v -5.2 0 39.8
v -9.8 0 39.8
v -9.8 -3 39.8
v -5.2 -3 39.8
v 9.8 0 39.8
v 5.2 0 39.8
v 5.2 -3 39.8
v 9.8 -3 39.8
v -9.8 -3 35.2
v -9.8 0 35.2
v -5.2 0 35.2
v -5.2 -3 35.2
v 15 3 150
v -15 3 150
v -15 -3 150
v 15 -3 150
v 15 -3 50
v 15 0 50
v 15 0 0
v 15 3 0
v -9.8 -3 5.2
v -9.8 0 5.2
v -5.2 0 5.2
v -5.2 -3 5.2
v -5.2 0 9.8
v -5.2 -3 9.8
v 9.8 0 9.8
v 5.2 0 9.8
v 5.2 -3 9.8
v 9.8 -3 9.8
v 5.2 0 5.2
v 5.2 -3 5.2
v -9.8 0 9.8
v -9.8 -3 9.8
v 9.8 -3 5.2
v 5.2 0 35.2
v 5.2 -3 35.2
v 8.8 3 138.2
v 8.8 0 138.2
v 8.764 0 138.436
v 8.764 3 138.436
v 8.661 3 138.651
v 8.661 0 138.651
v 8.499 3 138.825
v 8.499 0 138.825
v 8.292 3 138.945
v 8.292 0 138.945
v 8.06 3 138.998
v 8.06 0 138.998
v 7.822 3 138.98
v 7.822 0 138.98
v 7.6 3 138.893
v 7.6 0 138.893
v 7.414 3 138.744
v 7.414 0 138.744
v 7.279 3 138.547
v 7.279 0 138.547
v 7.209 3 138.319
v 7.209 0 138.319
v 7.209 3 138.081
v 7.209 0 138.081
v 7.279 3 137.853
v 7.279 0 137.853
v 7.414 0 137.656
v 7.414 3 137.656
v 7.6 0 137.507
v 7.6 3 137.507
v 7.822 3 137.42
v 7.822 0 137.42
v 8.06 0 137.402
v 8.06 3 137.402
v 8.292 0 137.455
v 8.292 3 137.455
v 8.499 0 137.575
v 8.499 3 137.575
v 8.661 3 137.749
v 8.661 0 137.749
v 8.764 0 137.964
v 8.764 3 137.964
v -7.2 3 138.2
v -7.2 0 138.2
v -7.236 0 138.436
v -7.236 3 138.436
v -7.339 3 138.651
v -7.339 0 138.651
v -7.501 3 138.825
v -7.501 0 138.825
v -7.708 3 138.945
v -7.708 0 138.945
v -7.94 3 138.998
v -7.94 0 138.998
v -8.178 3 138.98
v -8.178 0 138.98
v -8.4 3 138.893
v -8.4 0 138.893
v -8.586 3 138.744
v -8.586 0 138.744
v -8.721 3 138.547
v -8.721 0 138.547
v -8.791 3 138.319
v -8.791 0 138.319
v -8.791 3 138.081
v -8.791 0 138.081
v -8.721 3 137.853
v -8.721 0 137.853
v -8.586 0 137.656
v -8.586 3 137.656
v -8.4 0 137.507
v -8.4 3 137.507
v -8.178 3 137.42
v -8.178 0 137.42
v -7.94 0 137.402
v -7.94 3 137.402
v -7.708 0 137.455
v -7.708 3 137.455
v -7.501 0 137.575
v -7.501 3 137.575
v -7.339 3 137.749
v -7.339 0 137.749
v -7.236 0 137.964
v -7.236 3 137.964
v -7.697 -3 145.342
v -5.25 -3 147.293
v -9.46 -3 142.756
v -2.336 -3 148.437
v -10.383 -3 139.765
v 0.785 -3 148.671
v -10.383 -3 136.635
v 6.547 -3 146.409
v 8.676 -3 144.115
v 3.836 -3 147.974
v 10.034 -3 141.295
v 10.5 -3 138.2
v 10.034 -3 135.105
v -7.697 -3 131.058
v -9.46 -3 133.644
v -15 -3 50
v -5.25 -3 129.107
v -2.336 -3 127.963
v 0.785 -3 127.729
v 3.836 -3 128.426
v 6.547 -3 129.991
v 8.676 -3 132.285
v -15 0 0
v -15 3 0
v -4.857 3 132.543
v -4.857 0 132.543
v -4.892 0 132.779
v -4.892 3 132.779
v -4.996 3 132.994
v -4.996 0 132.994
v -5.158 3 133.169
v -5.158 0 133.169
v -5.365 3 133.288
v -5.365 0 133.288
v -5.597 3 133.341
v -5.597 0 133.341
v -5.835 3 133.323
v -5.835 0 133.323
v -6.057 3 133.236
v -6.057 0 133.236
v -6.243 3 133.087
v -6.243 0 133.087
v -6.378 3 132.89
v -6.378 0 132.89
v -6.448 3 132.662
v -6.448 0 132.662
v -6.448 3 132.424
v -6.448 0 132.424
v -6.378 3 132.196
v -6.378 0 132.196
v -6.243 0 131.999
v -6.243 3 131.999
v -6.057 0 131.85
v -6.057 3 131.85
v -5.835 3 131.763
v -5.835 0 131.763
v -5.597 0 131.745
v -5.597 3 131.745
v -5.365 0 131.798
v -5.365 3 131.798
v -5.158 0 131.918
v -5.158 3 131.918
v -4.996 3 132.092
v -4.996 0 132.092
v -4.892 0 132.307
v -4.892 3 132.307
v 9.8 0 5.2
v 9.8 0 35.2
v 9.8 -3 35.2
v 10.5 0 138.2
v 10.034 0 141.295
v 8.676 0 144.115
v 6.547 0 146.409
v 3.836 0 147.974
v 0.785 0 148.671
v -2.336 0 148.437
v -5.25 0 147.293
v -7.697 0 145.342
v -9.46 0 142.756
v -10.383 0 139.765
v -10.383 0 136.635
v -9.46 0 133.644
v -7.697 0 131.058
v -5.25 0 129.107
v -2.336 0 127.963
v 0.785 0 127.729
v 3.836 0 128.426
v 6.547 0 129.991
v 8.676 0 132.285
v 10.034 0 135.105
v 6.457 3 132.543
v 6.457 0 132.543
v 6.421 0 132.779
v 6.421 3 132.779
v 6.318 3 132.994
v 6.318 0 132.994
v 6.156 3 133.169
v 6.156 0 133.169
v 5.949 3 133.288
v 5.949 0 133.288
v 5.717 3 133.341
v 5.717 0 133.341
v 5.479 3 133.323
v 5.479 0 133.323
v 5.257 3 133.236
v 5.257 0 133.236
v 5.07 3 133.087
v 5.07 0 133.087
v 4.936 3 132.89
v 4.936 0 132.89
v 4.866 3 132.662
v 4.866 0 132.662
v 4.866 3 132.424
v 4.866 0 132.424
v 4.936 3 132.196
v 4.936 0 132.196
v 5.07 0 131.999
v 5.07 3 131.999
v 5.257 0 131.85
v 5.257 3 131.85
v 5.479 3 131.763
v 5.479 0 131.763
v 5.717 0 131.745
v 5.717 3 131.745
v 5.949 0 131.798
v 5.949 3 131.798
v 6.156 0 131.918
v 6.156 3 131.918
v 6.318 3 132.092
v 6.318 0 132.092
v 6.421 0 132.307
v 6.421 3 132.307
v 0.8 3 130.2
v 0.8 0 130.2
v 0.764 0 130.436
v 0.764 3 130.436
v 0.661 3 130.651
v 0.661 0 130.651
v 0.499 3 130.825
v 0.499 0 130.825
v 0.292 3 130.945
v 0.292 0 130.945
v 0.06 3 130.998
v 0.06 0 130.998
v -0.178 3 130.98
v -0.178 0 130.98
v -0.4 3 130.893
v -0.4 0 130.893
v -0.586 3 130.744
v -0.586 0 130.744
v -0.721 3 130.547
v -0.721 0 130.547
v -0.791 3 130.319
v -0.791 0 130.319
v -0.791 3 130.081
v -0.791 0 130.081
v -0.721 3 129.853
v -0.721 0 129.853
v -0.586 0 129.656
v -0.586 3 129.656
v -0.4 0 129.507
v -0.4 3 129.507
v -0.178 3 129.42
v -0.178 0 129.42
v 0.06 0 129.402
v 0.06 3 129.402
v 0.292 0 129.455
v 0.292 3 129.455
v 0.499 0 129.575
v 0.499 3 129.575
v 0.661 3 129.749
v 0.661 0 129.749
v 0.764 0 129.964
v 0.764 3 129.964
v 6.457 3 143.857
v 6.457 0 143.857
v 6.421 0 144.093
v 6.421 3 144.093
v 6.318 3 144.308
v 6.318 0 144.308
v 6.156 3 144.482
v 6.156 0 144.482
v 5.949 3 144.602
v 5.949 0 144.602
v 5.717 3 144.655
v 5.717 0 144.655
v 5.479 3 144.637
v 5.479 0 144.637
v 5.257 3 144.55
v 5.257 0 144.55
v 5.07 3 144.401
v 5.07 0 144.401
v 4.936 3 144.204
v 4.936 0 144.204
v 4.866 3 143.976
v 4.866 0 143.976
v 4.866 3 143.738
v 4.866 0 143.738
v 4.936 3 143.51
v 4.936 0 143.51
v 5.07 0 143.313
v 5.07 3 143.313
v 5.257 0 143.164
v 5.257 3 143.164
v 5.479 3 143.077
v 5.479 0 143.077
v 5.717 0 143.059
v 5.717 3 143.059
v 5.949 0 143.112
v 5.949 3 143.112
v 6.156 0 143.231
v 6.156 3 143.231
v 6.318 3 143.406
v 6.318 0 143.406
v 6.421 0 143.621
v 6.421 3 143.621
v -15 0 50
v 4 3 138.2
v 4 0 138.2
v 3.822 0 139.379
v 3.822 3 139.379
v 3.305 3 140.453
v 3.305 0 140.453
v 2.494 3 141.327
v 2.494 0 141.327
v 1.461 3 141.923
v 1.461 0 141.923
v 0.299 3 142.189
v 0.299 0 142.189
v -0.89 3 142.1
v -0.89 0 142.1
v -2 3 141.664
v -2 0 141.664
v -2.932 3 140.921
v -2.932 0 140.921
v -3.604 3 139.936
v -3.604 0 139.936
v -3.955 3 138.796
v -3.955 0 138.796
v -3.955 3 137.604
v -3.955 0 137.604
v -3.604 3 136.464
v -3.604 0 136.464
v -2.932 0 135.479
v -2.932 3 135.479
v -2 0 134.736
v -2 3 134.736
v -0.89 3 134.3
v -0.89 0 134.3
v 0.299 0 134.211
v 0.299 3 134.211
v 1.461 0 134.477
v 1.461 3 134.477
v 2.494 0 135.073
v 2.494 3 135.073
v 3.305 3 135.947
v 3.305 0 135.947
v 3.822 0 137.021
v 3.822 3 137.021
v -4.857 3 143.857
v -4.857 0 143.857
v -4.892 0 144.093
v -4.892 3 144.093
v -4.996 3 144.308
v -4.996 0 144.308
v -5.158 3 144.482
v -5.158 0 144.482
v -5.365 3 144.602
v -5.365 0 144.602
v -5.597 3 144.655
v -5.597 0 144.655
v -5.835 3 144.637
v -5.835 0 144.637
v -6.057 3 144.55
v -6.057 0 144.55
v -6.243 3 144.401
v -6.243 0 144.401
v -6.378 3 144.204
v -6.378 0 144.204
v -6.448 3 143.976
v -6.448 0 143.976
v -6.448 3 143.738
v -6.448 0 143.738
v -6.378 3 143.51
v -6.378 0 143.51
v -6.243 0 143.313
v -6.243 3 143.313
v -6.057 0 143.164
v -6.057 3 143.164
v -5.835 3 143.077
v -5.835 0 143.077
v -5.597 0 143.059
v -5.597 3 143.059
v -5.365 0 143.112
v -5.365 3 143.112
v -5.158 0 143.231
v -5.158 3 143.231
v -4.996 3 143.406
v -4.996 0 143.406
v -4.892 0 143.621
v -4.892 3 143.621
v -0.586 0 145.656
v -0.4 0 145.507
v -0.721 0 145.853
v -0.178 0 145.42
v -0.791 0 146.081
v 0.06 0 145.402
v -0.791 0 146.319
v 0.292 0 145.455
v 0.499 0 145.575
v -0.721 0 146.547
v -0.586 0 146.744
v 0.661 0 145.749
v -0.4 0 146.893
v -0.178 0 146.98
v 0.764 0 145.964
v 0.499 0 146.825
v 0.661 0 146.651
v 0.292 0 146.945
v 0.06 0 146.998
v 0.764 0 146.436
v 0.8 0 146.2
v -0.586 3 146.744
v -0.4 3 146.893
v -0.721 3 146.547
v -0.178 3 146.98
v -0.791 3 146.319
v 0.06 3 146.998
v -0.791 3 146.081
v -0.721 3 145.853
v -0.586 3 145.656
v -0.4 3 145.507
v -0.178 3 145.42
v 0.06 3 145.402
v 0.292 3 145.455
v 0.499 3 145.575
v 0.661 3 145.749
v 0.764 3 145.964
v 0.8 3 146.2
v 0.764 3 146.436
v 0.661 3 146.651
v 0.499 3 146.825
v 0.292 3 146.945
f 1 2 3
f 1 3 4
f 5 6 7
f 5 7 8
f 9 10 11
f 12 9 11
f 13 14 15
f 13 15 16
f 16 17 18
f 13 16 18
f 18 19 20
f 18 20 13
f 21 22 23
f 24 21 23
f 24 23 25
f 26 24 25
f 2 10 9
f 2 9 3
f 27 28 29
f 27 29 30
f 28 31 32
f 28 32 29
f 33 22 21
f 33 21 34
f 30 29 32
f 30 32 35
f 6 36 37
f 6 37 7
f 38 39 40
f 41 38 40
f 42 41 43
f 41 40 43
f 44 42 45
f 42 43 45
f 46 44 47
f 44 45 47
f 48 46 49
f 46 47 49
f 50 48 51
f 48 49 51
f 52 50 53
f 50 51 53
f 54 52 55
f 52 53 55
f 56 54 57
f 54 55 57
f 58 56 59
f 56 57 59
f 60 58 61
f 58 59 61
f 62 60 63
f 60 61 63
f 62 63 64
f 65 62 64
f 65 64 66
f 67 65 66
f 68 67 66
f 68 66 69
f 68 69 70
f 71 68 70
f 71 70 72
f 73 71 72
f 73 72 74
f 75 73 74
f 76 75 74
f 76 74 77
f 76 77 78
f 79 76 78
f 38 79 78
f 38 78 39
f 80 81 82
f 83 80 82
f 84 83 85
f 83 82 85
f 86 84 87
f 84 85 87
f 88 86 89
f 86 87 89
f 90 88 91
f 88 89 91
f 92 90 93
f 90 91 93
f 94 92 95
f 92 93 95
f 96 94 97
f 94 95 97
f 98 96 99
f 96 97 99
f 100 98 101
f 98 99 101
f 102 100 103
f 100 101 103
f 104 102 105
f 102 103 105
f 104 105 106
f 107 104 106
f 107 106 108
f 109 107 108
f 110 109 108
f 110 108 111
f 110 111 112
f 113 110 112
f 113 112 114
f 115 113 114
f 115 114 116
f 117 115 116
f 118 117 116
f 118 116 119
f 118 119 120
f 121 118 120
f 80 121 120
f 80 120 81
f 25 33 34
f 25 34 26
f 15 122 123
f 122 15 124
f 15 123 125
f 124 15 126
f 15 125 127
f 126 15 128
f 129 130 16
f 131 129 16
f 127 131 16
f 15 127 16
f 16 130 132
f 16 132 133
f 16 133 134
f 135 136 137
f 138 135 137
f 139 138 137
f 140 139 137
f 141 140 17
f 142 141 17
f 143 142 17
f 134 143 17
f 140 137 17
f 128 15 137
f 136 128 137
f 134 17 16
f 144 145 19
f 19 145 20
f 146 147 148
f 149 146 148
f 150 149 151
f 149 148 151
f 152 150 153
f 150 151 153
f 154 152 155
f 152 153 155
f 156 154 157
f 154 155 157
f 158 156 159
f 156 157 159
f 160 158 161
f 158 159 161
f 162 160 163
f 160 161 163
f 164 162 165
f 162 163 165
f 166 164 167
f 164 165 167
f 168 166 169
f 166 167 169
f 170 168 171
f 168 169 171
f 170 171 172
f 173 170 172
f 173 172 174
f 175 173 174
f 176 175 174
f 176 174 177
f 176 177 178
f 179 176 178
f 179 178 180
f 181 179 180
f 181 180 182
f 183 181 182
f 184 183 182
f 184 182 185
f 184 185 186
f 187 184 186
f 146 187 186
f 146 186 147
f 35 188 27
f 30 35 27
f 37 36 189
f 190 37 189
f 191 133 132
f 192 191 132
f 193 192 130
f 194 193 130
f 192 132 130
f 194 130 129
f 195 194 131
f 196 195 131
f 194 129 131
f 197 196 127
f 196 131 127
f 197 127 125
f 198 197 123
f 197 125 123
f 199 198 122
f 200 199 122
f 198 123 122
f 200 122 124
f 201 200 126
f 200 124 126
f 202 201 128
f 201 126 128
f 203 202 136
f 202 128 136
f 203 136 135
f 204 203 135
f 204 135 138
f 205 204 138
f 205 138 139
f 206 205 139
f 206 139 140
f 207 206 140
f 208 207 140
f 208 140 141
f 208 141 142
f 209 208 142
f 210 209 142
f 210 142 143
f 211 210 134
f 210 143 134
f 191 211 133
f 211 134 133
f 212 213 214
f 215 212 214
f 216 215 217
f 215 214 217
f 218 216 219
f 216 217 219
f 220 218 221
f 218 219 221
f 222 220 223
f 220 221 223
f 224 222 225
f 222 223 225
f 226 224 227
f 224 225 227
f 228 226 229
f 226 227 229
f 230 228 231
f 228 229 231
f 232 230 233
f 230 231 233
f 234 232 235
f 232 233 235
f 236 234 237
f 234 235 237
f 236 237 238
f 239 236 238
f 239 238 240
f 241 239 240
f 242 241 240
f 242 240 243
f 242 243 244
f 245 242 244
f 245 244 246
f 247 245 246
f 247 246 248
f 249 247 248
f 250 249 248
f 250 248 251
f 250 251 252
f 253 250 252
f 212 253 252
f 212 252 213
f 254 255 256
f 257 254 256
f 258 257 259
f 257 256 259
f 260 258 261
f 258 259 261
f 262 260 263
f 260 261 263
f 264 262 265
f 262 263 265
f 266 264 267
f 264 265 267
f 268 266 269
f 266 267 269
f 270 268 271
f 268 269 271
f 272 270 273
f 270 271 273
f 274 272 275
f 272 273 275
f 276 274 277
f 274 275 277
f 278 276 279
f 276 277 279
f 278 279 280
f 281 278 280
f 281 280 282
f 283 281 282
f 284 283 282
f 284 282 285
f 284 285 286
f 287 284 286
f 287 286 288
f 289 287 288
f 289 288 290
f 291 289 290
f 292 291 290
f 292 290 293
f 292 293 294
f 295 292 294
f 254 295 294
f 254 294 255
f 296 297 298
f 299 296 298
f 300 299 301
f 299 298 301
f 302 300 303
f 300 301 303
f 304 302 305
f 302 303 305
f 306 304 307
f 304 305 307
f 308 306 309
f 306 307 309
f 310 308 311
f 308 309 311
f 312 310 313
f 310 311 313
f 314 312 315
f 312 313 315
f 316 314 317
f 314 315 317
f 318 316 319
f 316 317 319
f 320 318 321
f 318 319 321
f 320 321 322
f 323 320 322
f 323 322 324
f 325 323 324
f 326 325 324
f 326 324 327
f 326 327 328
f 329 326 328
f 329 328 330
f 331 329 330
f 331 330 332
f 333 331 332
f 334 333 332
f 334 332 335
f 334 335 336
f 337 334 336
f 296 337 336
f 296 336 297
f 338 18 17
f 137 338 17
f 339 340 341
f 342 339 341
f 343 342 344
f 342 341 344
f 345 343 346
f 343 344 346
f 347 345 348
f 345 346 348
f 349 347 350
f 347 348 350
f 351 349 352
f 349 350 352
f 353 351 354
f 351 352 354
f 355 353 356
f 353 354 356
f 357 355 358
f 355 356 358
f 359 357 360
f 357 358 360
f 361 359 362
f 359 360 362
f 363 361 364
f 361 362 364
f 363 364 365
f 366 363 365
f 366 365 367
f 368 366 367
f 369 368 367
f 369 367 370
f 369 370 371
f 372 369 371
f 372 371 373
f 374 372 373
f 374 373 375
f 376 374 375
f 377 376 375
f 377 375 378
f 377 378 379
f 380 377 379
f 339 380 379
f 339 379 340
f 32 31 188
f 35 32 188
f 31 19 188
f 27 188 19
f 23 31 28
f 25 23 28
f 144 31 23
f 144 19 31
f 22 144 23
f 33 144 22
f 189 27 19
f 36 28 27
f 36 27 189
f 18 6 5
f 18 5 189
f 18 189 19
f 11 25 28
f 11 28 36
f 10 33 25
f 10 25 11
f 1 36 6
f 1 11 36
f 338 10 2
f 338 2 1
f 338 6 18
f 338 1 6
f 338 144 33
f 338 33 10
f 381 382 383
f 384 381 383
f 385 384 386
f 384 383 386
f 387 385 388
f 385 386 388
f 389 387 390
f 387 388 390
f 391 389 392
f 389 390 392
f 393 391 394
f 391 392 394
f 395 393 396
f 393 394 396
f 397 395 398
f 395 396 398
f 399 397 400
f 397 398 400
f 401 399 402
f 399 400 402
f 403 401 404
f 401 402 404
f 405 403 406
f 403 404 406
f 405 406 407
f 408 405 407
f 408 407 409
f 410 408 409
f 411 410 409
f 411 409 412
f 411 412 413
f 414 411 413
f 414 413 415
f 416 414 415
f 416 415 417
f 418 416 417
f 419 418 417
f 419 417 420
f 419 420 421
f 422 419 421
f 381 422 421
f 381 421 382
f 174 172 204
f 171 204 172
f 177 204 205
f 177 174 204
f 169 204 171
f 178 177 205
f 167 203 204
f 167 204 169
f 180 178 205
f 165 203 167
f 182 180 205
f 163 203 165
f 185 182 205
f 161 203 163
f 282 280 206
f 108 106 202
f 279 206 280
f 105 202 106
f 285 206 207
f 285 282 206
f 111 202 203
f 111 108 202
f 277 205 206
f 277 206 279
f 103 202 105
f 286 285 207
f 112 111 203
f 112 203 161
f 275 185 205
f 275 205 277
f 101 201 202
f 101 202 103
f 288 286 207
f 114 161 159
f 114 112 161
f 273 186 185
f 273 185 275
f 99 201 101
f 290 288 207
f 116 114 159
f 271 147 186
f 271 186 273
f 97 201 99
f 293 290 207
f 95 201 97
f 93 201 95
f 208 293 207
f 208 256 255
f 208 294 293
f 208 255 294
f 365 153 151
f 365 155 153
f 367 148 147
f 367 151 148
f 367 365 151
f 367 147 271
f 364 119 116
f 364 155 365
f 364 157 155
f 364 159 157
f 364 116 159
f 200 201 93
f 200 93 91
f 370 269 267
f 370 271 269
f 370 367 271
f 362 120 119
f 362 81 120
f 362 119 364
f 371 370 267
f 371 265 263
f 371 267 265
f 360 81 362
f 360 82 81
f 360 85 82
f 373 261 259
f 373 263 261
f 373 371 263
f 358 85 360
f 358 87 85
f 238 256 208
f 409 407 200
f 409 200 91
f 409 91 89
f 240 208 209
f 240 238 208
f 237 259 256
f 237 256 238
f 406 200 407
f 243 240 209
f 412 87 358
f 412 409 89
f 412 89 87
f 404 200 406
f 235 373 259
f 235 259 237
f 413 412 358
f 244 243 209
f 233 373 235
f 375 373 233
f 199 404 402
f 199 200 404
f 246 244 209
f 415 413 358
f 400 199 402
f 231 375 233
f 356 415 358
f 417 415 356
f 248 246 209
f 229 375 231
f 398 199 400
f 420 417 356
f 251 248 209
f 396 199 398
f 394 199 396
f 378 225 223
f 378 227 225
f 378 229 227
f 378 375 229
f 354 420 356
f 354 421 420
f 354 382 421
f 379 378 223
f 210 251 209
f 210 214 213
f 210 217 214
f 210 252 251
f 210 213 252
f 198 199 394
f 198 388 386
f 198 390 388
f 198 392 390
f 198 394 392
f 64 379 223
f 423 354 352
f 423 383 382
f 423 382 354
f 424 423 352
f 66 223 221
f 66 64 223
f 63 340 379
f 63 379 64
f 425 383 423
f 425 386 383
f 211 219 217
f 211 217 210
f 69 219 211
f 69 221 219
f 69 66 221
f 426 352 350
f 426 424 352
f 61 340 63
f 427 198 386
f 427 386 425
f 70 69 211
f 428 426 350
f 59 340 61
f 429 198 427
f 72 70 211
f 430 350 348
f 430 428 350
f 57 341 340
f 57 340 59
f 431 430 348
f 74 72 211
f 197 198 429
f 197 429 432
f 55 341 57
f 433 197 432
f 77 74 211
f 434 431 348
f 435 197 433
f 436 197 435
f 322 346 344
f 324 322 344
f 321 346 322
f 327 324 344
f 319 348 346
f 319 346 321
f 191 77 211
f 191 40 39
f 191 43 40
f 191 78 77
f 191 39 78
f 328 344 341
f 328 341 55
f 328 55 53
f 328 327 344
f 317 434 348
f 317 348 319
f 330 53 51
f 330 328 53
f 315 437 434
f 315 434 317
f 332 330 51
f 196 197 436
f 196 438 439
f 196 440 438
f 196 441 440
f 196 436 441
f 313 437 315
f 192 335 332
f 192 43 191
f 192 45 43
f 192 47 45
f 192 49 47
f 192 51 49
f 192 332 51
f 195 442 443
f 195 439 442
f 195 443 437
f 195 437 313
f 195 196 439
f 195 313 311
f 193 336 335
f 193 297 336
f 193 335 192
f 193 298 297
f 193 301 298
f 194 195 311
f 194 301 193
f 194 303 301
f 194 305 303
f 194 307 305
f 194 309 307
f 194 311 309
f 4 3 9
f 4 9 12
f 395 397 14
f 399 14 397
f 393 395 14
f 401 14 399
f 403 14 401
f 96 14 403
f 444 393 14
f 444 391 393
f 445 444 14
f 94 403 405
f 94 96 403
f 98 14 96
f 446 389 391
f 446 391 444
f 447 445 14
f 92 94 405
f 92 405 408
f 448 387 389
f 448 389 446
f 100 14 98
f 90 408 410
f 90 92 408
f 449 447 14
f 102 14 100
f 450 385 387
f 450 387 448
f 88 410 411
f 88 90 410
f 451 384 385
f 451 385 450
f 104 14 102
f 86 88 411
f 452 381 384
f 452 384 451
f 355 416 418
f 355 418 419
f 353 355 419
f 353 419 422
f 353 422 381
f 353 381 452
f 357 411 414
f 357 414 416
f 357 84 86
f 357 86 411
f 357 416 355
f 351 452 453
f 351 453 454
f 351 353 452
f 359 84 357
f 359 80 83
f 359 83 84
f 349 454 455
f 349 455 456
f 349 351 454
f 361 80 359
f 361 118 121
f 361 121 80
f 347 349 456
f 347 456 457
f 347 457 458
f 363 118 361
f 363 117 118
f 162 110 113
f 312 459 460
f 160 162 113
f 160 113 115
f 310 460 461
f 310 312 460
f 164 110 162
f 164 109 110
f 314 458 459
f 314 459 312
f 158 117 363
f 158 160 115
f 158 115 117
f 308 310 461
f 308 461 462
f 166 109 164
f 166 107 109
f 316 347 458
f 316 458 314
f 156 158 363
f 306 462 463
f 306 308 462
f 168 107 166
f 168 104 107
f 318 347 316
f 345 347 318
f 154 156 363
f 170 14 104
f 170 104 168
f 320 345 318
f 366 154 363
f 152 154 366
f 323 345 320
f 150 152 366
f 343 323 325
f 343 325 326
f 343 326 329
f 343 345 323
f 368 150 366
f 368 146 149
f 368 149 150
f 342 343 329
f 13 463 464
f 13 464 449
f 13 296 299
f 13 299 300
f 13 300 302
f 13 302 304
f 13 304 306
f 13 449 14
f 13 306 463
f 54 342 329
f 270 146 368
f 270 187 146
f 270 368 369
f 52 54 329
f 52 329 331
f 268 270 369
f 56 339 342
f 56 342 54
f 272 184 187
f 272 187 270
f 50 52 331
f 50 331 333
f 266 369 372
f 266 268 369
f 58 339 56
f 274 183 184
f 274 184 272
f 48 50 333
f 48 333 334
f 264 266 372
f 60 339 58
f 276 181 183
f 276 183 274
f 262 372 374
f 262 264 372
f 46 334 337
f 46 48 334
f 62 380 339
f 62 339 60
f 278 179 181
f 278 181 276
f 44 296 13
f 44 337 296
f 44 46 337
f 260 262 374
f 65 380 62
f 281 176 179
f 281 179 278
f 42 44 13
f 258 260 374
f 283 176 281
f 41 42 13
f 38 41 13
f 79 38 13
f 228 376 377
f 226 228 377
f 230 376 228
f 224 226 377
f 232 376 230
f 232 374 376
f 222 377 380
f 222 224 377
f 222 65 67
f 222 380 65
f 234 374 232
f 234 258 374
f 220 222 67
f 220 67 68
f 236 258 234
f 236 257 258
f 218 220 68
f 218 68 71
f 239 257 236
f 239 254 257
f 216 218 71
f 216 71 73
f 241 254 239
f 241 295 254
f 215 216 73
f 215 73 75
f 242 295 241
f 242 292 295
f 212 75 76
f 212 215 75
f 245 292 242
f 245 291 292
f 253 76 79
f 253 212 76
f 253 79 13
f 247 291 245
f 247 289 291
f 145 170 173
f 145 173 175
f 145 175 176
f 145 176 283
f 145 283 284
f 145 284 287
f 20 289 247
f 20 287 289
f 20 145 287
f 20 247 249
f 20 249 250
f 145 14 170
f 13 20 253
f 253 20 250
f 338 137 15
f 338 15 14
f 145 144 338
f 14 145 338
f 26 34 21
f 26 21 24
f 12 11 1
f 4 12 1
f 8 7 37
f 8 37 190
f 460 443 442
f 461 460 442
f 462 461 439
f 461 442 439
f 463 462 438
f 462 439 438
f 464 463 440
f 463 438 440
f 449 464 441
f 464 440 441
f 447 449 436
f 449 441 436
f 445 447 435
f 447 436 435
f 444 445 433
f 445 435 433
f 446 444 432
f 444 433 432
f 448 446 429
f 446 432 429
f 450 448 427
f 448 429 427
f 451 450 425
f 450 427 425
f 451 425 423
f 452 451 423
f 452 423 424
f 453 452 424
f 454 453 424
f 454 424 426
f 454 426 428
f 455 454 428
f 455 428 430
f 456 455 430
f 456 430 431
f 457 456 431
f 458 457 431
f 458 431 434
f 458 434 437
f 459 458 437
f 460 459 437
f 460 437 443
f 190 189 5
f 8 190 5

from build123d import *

# Parameters (mm, degrees)
F0_W     = 30
F0_H     = 6
F1_DEPTH = 150
F2_R     = 0.8
F2_R_2   = 4
F3_DEPTH = 6
F4_W     = 3
F4_H     = 50
F5_DEPTH = 30
F6_W     = 4.599998
F6_H     = 4.599998
F6_W_2   = 4.6
F6_H_2   = 4.6
F7_DEPTH = 3
F8_R     = 10.5
F9_DEPTH = 3


with BuildPart() as f1:
    # F0 (on Top) → F1 (new body)
    with BuildSketch(Plane.XY):
        Rectangle(F0_W, F0_H)
    extrude(amount=F1_DEPTH)

    # F2 (on face) → F3 (cut, through all)
    with BuildSketch(Plane.XZ.offset(3)):
        with Locations((0, 146.2)):
            Circle(F2_R)
        with Locations((0, 138.2)):
            Circle(F2_R_2)
        with Locations((-5.656854, 143.856854)):
            Circle(F2_R)
        with Locations((-8, 138.2)):
            Circle(F2_R)
        with Locations((-5.656854, 132.543146)):
            Circle(F2_R)
        with Locations((0, 130.2)):
            Circle(F2_R)
        with Locations((5.656854, 132.543146)):
            Circle(F2_R)
        with Locations((8, 138.2)):
            Circle(F2_R)
        with Locations((5.656854, 143.856854)):
            Circle(F2_R)
    extrude(amount=-F3_DEPTH, mode=Mode.SUBTRACT)

    # F4 (on face) → F5 (cut, through all)
    with BuildSketch(Plane(origin=(-15, 0, 0), x_dir=(0, -1, 0), z_dir=(-1, 0, 0))):
        with Locations((1.5, 25)):
            Rectangle(F4_W, F4_H)
    extrude(amount=-F5_DEPTH, mode=Mode.SUBTRACT)

    # F6 (on face) → F7 (join)
    with BuildSketch(Plane.XZ):
        with Locations((7.5, 37.5)):
            Rectangle(F6_W, F6_H)
        with Locations((-7.5, 37.5)):
            Rectangle(F6_W, F6_H)
        with Locations((-7.5, 7.5)):
            Rectangle(F6_W_2, F6_H_2)
        with Locations((7.5, 7.5)):
            Rectangle(F6_W_2, F6_H_2)
    extrude(amount=F7_DEPTH)

    # F8 (on face) → F9 (cut)
    with BuildSketch(Plane.XZ.offset(3)):
        with Locations((0, 138.2)):
            Circle(F8_R)
    extrude(amount=-F9_DEPTH, mode=Mode.SUBTRACT)


solid = f1.part
